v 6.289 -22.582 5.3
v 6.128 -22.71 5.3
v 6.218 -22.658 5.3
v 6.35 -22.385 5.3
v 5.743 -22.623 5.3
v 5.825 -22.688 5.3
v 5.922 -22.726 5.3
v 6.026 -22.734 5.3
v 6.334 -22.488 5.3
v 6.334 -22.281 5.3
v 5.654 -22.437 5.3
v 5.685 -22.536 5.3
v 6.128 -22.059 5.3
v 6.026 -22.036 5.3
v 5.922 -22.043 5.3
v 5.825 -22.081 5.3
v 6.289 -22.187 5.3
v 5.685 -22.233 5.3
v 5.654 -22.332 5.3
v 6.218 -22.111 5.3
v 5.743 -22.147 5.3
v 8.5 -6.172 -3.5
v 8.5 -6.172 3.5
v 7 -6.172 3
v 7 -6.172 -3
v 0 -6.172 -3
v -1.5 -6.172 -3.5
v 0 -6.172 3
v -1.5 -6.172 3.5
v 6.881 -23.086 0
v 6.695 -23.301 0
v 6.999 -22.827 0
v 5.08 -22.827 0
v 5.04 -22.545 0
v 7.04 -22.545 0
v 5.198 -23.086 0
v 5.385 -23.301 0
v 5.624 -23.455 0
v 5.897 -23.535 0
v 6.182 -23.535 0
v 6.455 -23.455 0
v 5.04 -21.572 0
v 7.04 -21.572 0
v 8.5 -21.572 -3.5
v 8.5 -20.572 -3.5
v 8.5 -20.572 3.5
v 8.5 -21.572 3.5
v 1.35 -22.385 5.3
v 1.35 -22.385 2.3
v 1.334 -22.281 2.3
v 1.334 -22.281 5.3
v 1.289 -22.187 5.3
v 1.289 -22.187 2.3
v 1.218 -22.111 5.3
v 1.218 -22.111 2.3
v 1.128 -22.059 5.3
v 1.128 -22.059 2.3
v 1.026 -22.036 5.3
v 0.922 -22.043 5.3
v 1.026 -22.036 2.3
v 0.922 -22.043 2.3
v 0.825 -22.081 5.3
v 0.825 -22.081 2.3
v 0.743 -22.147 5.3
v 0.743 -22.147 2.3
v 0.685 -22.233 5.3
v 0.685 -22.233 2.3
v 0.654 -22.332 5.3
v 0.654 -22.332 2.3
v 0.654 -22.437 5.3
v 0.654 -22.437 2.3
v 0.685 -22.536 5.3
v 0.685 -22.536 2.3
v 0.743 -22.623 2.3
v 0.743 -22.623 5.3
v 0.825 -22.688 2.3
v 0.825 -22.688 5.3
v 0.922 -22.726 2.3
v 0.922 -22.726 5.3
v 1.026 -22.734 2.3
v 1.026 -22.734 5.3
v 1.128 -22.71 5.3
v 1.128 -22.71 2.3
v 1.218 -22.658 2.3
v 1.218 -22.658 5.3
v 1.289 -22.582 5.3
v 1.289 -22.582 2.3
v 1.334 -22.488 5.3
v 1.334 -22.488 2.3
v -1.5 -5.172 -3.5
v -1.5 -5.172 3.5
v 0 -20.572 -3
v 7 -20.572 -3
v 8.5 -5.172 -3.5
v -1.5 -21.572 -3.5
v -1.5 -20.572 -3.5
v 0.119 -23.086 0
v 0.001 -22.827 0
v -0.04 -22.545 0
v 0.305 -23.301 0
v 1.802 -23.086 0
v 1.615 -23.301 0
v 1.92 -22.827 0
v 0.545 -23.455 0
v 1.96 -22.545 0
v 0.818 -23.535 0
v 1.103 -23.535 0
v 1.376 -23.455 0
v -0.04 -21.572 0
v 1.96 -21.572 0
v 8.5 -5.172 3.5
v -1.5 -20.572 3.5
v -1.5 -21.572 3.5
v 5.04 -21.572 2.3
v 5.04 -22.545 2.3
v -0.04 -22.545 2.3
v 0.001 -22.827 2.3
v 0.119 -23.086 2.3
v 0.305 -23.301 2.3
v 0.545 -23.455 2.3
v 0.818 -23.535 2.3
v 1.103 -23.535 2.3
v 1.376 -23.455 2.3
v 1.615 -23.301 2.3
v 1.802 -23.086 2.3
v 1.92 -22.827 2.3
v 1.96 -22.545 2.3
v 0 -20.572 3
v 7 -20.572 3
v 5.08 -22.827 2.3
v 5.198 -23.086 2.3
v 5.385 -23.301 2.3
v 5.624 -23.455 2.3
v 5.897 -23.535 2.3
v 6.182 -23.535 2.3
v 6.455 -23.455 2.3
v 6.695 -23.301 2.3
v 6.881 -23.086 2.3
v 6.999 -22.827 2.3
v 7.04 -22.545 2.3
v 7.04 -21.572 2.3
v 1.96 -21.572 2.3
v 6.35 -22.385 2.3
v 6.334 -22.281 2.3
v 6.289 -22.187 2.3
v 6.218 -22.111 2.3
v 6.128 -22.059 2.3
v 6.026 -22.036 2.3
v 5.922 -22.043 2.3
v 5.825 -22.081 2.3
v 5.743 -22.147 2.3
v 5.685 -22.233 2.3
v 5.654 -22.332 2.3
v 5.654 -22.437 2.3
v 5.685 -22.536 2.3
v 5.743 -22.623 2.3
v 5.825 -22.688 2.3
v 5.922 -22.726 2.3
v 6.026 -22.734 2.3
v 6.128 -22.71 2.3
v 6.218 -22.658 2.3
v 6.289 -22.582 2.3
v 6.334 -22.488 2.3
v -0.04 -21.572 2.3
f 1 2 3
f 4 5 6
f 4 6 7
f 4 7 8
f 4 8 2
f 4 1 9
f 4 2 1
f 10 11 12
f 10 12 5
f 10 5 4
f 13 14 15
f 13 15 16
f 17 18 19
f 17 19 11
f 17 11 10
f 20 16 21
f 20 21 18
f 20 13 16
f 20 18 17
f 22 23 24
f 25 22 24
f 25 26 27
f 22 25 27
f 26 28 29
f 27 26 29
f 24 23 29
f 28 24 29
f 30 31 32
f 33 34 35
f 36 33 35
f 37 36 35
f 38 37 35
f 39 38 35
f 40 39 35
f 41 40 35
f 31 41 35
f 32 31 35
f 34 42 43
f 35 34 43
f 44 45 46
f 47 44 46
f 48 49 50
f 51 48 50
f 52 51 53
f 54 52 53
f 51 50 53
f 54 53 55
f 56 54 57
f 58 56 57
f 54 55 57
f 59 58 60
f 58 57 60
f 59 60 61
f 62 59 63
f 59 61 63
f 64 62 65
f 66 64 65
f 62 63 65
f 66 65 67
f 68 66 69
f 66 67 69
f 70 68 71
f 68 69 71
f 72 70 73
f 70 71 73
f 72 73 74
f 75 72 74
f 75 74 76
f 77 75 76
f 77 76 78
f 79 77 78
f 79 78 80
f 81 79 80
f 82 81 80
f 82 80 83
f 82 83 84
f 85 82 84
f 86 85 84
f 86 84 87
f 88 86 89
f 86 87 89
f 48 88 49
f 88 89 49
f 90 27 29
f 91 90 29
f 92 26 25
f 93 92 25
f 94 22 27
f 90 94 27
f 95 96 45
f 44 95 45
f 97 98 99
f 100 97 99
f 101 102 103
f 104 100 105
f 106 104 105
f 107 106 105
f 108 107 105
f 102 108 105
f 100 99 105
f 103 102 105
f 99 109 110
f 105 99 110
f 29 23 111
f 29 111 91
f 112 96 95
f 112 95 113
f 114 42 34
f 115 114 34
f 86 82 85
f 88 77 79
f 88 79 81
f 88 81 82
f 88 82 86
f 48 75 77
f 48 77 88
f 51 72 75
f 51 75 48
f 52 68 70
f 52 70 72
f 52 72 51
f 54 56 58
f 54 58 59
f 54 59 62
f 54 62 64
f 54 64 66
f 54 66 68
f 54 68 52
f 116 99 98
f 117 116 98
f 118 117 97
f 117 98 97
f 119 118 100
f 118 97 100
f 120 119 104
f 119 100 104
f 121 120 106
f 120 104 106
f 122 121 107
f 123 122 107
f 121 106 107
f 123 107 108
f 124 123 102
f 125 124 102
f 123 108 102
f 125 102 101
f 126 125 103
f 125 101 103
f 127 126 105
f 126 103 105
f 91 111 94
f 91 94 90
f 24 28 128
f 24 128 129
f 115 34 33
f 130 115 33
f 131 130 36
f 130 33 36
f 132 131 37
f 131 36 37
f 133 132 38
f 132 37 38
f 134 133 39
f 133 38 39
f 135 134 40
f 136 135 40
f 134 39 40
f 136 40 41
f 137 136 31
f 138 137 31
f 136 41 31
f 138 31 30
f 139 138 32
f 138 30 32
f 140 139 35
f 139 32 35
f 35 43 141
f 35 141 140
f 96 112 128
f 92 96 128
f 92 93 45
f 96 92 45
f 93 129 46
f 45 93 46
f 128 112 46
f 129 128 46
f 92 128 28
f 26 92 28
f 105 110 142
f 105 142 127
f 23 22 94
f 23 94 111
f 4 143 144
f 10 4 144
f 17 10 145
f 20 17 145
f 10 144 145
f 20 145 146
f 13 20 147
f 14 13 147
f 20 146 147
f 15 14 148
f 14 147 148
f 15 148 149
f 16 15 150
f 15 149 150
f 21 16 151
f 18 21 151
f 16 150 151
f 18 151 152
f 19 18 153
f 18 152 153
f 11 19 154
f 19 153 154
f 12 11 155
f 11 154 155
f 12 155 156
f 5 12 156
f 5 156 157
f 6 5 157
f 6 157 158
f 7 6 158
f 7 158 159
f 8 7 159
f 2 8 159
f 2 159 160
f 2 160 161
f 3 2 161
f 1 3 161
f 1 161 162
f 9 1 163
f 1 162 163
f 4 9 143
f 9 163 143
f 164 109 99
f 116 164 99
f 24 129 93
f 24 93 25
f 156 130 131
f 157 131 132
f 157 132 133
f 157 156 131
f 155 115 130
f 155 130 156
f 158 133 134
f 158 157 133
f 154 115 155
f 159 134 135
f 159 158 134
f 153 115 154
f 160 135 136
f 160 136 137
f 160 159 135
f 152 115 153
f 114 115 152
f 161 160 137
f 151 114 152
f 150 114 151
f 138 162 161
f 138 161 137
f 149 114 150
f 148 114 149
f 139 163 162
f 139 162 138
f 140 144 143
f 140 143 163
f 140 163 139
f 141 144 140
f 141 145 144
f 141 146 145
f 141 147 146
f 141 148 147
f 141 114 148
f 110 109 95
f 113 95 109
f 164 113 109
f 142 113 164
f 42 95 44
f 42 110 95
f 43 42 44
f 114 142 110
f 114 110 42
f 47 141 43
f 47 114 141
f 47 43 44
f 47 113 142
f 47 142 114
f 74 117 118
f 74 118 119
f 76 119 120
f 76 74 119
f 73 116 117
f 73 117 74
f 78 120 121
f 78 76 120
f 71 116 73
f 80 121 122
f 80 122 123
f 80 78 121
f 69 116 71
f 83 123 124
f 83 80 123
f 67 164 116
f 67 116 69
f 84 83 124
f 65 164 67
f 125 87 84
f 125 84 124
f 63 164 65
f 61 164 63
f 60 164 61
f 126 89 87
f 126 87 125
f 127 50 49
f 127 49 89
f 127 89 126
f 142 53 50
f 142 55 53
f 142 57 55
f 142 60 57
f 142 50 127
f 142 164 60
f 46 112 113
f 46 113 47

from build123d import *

# Parameters (mm, degrees)
SKETCH250_W  = 7
SKETCH250_H  = 14.4
PAD172_DEPTH = 3
SKETCH256_W  = 10
SKETCH256_H  = 7
PAD182_DEPTH = 1
SKETCH253_W  = 10
SKETCH253_H  = 7
PAD175_DEPTH = 1
PAD171_DEPTH = 2.3
SKETCH251_R  = 0.35
PAD183_DEPTH = 3


with BuildPart() as part:
    # Sketch250 → Pad172 (new body, symmetric)
    with BuildSketch(Plane.XY):
        with Locations((0, -0.37169)):
            Rectangle(SKETCH250_W, SKETCH250_H)
    extrude(amount=PAD172_DEPTH, both=True)

    # Sketch256 (on Face3 of Pad172) → Pad182 (join)
    with BuildSketch(Plane.XZ.offset(7.57169)):
        Rectangle(SKETCH256_W, SKETCH256_H)
    extrude(amount=PAD182_DEPTH)

    # Sketch253 (on Face11 of Pad182) → Pad175 (join)
    with BuildSketch(Plane(origin=(0, 6.82831, 0), x_dir=(-1, 0, 0), z_dir=(0, 1, 0))):
        Rectangle(SKETCH253_W, SKETCH253_H)
    extrude(amount=PAD175_DEPTH)

    # Sketch260 → Pad171 (join)
    with BuildSketch(Plane.XY):
        with BuildLine():
            ThreePointArc((-3.539731, -9.545275), (-2.539731, -10.545275), (-1.539731, -9.545275))
            Line((-1.539731, -8.57169), (-1.539731, -9.545275))
            Line((-3.539731, -8.57169), (-1.539731, -8.57169))
            Line((-3.539731, -8.57169), (-3.539731, -9.545275))
        make_face()
        with BuildLine():
            ThreePointArc((1.539731, -9.545275), (2.539731, -10.545275), (3.539731, -9.545275))
            Line((3.539731, -8.57169), (3.539731, -9.545275))
            Line((3.539731, -8.57169), (1.539731, -8.57169))
            Line((1.539731, -8.57169), (1.539731, -9.545275))
        make_face()
    extrude(amount=PAD171_DEPTH)

    # Sketch251 (on Face19 of Pad171) → Pad183 (join)
    with BuildSketch(Plane.XY.offset(2.3)):
        with Locations((-2.5, -9.384607)):
            Circle(SKETCH251_R)
        with Locations((2.5, -9.384607)):
            Circle(SKETCH251_R)
    extrude(amount=PAD183_DEPTH)


with BuildPart() as part_1:
    # Body052 placement: moved
    add(part.part.moved(Location((3.5, -13, 0))))


solid = part_1.part
